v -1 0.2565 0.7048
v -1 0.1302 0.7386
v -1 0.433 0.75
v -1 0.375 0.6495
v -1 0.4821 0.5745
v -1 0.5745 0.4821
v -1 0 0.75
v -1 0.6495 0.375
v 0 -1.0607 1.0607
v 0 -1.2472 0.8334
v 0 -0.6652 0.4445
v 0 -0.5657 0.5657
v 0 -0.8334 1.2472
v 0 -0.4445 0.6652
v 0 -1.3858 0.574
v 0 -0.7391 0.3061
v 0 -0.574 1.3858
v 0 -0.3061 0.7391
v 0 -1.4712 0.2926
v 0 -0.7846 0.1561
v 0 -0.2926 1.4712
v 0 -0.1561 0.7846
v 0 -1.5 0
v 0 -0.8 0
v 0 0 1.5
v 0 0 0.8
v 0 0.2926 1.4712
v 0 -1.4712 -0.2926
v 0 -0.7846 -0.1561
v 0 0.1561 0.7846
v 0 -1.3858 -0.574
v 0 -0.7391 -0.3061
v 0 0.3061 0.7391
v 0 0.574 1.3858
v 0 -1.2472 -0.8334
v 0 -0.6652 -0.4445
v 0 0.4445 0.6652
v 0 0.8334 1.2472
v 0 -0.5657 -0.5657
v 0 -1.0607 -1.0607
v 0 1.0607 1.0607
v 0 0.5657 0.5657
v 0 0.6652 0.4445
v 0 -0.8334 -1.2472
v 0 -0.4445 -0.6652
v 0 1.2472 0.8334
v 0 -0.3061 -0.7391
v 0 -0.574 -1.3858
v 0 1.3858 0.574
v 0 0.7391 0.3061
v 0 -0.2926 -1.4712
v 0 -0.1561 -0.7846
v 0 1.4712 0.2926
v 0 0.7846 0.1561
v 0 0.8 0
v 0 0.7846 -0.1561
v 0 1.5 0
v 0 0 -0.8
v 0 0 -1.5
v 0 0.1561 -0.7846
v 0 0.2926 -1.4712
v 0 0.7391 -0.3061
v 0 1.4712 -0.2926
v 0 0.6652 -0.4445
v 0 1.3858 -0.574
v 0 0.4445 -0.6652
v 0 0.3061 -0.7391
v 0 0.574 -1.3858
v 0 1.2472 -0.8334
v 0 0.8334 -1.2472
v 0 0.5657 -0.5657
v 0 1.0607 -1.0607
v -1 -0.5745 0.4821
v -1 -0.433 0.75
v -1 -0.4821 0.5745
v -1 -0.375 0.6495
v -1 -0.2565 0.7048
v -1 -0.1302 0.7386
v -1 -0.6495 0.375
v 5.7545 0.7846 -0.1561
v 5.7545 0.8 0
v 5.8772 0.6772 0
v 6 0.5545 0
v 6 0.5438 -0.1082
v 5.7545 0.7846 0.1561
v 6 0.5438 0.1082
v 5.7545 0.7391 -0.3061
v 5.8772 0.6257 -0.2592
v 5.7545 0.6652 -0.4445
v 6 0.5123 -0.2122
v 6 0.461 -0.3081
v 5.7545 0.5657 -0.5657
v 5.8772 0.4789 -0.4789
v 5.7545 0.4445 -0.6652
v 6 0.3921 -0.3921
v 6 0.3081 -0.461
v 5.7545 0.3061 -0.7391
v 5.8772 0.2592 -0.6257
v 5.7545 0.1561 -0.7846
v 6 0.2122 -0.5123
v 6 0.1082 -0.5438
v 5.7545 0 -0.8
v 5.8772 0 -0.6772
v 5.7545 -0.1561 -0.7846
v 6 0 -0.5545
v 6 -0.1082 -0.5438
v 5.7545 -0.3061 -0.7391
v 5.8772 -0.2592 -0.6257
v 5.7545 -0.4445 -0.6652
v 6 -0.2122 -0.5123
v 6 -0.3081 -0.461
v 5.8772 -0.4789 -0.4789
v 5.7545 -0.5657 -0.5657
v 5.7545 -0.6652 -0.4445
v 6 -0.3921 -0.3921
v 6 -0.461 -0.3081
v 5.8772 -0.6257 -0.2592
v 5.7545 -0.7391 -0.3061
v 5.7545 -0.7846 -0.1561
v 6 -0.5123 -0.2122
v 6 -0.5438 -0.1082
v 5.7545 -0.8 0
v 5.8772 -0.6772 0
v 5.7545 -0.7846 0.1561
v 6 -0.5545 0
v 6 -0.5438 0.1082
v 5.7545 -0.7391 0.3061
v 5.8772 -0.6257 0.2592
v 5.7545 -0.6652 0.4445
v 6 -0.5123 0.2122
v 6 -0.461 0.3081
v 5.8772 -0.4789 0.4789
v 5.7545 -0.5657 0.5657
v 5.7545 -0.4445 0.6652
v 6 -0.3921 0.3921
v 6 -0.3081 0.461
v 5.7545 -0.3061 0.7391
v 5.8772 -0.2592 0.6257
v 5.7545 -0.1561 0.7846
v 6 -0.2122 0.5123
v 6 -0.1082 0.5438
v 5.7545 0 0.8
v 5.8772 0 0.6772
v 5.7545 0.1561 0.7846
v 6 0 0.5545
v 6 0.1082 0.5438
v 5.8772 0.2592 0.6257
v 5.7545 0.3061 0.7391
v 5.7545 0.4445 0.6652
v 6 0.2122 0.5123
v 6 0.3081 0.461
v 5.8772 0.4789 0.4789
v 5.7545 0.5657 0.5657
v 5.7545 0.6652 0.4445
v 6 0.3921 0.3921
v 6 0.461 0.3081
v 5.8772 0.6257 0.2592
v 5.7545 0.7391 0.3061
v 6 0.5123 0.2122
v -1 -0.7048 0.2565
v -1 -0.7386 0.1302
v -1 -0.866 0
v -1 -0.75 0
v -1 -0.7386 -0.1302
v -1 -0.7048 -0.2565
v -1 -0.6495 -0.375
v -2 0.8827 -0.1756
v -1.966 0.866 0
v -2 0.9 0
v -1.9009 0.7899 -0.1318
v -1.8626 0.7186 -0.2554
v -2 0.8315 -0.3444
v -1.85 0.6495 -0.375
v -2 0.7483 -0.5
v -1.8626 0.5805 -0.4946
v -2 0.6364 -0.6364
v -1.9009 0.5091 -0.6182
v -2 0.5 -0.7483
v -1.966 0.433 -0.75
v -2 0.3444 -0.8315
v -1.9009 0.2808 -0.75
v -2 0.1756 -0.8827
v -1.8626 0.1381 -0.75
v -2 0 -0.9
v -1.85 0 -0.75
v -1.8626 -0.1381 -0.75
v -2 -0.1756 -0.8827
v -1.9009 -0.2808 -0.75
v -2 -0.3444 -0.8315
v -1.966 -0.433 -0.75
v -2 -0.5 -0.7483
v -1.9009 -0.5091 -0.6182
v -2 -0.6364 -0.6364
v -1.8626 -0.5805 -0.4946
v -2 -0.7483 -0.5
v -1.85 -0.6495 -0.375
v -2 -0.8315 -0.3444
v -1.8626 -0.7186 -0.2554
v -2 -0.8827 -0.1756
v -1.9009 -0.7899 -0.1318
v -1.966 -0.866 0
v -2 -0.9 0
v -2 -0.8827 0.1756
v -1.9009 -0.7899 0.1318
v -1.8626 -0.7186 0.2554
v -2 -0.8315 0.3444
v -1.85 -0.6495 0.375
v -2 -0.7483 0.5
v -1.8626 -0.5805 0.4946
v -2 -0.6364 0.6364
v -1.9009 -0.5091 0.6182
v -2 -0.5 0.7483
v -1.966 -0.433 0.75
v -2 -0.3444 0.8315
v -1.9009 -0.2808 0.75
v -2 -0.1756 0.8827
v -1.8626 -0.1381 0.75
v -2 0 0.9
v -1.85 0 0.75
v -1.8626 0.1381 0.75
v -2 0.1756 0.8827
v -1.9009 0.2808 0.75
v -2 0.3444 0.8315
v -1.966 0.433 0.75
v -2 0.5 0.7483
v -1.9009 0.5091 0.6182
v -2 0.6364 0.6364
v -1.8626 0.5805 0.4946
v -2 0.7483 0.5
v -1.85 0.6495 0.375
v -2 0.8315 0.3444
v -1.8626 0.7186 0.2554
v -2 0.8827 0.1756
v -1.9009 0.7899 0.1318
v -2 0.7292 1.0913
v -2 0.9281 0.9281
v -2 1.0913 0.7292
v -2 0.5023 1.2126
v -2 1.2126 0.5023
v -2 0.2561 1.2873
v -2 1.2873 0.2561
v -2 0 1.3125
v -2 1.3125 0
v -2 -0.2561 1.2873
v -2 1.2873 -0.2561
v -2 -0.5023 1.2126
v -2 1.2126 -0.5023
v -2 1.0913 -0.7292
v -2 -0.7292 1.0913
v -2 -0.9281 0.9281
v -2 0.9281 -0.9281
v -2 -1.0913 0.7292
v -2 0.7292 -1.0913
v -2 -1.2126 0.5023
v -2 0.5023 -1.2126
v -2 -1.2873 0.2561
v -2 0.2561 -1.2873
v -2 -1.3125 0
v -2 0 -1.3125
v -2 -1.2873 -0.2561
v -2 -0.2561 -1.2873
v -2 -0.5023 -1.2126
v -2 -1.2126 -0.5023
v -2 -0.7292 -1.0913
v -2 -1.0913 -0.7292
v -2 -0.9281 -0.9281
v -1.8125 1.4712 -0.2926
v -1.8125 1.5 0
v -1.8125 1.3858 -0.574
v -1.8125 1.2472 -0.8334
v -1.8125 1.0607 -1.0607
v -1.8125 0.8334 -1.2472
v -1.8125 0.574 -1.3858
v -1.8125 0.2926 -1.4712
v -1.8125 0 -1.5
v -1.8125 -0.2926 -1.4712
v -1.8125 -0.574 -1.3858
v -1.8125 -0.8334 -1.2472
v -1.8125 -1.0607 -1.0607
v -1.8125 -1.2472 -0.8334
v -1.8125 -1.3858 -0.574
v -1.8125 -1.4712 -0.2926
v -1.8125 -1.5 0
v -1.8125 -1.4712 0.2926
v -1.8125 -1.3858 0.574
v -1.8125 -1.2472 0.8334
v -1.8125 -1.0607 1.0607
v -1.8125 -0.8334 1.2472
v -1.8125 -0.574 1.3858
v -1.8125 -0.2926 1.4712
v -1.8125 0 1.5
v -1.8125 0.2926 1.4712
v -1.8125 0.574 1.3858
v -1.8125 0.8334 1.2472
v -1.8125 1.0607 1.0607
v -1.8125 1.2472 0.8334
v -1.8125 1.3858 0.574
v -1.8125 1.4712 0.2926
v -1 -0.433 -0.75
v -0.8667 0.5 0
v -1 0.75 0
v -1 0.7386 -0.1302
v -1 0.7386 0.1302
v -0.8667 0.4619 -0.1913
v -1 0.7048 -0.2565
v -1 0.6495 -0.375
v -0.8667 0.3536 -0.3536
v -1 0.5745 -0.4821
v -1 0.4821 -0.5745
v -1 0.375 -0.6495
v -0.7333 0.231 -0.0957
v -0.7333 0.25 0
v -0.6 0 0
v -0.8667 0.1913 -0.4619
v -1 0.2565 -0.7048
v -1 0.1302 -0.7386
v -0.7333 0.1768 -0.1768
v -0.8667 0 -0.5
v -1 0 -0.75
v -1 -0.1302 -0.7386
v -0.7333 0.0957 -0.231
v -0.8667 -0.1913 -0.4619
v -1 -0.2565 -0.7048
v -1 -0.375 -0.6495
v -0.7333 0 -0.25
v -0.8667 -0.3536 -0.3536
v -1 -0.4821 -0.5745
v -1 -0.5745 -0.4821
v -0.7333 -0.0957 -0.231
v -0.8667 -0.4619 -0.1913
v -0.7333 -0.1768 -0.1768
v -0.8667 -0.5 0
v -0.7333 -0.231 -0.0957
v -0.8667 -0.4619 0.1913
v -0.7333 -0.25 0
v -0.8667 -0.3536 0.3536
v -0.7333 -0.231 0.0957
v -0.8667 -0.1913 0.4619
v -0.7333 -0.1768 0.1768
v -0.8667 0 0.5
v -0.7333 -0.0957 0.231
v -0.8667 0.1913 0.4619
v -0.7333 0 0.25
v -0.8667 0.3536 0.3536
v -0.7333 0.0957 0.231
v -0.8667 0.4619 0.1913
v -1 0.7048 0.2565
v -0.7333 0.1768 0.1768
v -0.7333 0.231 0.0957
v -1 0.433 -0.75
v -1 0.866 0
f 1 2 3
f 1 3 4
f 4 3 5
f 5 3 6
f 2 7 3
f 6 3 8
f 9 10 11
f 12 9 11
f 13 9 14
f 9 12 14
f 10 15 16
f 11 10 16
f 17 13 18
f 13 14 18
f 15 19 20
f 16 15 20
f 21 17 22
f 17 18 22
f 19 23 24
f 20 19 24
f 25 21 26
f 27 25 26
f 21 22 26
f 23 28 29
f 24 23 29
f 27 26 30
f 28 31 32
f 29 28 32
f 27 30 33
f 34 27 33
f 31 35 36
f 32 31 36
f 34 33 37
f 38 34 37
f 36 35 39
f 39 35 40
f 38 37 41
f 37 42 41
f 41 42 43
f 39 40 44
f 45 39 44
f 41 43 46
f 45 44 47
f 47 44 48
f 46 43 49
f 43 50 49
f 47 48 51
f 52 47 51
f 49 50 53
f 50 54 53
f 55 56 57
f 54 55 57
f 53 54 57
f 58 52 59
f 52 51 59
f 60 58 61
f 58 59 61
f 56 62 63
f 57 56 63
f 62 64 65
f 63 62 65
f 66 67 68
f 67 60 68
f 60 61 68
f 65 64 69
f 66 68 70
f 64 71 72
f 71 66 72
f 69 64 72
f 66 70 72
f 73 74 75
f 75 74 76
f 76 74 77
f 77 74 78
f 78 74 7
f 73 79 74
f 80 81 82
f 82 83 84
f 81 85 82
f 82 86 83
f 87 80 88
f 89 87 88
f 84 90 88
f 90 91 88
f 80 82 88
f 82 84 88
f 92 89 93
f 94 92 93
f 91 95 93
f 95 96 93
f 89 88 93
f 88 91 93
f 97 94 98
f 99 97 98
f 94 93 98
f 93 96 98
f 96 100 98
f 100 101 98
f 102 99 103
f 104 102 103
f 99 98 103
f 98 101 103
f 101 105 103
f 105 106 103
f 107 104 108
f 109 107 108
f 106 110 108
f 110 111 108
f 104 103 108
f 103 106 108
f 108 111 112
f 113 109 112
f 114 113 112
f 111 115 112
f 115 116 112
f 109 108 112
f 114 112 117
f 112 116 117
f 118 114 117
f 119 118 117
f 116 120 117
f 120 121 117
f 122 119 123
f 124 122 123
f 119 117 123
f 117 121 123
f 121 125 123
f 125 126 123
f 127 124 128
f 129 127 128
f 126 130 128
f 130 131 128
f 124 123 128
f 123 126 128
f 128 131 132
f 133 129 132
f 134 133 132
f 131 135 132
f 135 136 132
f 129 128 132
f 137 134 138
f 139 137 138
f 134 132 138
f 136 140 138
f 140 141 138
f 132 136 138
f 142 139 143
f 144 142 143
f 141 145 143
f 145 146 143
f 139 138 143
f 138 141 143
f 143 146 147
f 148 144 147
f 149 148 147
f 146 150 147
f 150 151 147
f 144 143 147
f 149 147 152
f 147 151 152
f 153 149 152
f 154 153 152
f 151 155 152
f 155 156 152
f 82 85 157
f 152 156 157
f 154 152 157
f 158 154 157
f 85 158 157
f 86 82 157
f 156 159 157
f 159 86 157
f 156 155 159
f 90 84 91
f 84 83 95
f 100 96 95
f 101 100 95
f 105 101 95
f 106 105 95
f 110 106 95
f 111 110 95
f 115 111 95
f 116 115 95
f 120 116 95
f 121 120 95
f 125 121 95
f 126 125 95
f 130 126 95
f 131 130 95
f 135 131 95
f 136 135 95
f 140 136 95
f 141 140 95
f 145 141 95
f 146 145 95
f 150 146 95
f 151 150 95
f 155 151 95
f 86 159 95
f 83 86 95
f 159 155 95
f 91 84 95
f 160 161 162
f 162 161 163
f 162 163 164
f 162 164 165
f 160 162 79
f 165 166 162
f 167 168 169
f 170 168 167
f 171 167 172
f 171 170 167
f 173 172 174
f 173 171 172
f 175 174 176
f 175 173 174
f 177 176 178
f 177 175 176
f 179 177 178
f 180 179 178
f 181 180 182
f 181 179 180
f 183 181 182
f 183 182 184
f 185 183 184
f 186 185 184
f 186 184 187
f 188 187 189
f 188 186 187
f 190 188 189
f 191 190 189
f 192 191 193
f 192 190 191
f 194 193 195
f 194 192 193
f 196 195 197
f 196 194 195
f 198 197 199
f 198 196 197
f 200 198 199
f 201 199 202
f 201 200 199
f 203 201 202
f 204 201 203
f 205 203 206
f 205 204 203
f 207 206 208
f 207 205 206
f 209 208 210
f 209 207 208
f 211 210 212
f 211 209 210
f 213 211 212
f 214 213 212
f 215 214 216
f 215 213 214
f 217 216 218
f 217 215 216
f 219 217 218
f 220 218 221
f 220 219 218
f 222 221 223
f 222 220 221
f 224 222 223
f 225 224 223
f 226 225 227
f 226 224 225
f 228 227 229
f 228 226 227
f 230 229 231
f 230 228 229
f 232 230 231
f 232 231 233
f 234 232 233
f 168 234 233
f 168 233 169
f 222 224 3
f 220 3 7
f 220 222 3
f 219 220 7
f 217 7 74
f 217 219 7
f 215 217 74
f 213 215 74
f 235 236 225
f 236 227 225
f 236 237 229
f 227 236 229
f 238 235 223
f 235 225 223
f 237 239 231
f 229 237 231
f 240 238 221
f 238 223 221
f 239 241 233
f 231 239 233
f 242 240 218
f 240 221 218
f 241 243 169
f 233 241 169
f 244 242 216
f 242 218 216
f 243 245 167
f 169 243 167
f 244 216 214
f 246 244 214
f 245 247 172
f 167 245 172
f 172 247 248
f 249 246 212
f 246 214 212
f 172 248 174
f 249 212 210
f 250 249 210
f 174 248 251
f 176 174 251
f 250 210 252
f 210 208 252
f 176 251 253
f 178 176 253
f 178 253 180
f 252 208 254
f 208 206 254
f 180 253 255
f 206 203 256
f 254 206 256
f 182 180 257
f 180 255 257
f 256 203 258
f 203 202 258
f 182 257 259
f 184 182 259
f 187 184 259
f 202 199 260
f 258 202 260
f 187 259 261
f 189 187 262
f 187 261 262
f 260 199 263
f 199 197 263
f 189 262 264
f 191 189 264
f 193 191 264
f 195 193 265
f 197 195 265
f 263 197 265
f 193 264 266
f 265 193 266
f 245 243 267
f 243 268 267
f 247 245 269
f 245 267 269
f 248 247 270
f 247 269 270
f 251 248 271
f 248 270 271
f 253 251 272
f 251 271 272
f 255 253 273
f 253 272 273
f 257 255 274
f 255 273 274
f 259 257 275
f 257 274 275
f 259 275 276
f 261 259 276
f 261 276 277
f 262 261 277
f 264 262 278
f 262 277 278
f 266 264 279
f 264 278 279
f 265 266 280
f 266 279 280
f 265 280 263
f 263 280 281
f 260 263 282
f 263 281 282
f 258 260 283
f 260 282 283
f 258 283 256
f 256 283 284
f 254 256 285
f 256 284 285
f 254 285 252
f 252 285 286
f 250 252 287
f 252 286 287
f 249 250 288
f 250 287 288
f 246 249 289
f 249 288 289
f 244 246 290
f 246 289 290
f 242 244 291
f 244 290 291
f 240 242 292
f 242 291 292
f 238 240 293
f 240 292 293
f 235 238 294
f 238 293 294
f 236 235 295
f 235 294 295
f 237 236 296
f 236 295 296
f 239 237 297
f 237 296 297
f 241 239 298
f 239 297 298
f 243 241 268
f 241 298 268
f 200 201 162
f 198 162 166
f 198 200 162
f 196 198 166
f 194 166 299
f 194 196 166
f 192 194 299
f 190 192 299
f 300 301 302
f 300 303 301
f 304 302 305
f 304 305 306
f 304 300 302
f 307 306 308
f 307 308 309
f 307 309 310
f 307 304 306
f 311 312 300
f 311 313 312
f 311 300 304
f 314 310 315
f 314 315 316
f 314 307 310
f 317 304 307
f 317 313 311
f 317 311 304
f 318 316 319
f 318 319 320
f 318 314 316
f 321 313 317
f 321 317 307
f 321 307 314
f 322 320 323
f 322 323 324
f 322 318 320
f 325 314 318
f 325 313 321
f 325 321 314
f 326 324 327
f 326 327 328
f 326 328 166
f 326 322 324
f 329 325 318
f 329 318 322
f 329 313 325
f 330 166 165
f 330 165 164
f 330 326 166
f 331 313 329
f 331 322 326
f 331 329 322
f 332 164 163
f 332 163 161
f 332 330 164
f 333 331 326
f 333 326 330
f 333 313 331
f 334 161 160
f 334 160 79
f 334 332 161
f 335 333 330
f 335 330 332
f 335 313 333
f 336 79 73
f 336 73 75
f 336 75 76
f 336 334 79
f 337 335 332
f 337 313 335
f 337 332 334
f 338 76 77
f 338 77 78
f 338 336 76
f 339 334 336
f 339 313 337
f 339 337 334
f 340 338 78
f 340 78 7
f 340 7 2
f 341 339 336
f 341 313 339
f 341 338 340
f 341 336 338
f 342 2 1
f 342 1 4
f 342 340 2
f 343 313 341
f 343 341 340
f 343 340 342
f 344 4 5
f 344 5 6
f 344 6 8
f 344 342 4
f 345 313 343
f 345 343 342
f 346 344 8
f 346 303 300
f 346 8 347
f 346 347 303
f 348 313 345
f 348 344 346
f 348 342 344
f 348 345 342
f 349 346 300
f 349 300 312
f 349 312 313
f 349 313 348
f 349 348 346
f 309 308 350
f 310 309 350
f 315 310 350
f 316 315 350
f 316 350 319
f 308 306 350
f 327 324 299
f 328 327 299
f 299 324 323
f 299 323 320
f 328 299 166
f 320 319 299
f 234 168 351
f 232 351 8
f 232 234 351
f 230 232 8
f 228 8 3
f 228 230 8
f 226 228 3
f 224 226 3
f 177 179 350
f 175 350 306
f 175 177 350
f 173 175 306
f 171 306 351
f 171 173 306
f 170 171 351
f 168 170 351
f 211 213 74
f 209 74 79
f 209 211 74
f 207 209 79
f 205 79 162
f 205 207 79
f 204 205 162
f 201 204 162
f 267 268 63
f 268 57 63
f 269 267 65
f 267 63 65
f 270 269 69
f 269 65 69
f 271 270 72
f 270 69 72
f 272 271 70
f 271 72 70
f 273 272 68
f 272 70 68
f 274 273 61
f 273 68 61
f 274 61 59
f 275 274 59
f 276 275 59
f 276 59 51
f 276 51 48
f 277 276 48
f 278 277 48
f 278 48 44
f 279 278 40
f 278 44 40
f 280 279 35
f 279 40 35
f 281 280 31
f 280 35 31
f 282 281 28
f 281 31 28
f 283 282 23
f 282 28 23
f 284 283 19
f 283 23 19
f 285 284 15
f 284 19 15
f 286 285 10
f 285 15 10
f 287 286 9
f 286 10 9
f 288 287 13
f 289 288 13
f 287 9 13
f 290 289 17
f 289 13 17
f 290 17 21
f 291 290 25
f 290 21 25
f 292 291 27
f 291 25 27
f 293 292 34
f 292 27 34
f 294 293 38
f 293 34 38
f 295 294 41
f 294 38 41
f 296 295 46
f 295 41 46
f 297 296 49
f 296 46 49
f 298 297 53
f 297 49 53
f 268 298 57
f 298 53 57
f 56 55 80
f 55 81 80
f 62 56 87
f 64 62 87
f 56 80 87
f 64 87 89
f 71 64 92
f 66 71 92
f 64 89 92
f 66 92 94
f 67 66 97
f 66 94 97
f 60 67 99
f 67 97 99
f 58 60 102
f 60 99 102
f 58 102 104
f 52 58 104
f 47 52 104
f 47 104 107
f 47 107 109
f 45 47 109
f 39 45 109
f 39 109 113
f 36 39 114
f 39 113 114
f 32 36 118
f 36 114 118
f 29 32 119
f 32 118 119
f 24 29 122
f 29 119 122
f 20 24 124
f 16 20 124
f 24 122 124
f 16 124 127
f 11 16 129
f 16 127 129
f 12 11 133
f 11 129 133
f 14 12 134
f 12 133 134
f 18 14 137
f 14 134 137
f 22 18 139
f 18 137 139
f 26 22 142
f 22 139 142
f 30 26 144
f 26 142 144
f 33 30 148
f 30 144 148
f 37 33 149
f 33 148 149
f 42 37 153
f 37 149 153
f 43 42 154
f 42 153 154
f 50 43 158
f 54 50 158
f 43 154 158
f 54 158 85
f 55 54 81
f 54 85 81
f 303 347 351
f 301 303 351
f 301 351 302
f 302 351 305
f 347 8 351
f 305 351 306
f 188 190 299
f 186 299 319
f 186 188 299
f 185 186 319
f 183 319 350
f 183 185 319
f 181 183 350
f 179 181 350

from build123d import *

# Parameters (mm, degrees)
CUT_EXTRUDE1_DEPTH = 1


with BuildPart() as part:
    # Sketch1 → Revolve1 (revolve)
    with BuildSketch(Plane.XY):
        Polygon((-2, 0), (-2, 1.3125), (-1.8125, 1.5), (0, 1.5), (0, 0.8), (5.7545, 0.8), (6, 0.5545), (6, 0), align=None)
    revolve(axis=Axis((6, 0, 0), (-1, 0, 0)))

    # Sketch2 → Cut-Revolve1 (revolve, cut)
    with BuildSketch(Plane.XY):
        Polygon((-2, 0), (-2, 0.9), (-1.85, 0.75), (-1, 0.75), (-0.6, 0), align=None)
    revolve(axis=Axis((-0.6, 0, 0), (-1, 0, 0)), mode=Mode.SUBTRACT)

    # Sketch3 → Cut-Extrude1 (cut)
    with BuildSketch(Plane(origin=(-2, 0, 0), x_dir=(0, 0, -1), z_dir=(1, 0, 0))):
        Polygon((-0.75, -0.433012702), (0, -0.866025404), (0.75, -0.433012702), (0.75, 0.433012702), (0, 0.866025404), (-0.75, 0.433012702), align=None)
    extrude(amount=CUT_EXTRUDE1_DEPTH, mode=Mode.SUBTRACT)


solid = part.part
